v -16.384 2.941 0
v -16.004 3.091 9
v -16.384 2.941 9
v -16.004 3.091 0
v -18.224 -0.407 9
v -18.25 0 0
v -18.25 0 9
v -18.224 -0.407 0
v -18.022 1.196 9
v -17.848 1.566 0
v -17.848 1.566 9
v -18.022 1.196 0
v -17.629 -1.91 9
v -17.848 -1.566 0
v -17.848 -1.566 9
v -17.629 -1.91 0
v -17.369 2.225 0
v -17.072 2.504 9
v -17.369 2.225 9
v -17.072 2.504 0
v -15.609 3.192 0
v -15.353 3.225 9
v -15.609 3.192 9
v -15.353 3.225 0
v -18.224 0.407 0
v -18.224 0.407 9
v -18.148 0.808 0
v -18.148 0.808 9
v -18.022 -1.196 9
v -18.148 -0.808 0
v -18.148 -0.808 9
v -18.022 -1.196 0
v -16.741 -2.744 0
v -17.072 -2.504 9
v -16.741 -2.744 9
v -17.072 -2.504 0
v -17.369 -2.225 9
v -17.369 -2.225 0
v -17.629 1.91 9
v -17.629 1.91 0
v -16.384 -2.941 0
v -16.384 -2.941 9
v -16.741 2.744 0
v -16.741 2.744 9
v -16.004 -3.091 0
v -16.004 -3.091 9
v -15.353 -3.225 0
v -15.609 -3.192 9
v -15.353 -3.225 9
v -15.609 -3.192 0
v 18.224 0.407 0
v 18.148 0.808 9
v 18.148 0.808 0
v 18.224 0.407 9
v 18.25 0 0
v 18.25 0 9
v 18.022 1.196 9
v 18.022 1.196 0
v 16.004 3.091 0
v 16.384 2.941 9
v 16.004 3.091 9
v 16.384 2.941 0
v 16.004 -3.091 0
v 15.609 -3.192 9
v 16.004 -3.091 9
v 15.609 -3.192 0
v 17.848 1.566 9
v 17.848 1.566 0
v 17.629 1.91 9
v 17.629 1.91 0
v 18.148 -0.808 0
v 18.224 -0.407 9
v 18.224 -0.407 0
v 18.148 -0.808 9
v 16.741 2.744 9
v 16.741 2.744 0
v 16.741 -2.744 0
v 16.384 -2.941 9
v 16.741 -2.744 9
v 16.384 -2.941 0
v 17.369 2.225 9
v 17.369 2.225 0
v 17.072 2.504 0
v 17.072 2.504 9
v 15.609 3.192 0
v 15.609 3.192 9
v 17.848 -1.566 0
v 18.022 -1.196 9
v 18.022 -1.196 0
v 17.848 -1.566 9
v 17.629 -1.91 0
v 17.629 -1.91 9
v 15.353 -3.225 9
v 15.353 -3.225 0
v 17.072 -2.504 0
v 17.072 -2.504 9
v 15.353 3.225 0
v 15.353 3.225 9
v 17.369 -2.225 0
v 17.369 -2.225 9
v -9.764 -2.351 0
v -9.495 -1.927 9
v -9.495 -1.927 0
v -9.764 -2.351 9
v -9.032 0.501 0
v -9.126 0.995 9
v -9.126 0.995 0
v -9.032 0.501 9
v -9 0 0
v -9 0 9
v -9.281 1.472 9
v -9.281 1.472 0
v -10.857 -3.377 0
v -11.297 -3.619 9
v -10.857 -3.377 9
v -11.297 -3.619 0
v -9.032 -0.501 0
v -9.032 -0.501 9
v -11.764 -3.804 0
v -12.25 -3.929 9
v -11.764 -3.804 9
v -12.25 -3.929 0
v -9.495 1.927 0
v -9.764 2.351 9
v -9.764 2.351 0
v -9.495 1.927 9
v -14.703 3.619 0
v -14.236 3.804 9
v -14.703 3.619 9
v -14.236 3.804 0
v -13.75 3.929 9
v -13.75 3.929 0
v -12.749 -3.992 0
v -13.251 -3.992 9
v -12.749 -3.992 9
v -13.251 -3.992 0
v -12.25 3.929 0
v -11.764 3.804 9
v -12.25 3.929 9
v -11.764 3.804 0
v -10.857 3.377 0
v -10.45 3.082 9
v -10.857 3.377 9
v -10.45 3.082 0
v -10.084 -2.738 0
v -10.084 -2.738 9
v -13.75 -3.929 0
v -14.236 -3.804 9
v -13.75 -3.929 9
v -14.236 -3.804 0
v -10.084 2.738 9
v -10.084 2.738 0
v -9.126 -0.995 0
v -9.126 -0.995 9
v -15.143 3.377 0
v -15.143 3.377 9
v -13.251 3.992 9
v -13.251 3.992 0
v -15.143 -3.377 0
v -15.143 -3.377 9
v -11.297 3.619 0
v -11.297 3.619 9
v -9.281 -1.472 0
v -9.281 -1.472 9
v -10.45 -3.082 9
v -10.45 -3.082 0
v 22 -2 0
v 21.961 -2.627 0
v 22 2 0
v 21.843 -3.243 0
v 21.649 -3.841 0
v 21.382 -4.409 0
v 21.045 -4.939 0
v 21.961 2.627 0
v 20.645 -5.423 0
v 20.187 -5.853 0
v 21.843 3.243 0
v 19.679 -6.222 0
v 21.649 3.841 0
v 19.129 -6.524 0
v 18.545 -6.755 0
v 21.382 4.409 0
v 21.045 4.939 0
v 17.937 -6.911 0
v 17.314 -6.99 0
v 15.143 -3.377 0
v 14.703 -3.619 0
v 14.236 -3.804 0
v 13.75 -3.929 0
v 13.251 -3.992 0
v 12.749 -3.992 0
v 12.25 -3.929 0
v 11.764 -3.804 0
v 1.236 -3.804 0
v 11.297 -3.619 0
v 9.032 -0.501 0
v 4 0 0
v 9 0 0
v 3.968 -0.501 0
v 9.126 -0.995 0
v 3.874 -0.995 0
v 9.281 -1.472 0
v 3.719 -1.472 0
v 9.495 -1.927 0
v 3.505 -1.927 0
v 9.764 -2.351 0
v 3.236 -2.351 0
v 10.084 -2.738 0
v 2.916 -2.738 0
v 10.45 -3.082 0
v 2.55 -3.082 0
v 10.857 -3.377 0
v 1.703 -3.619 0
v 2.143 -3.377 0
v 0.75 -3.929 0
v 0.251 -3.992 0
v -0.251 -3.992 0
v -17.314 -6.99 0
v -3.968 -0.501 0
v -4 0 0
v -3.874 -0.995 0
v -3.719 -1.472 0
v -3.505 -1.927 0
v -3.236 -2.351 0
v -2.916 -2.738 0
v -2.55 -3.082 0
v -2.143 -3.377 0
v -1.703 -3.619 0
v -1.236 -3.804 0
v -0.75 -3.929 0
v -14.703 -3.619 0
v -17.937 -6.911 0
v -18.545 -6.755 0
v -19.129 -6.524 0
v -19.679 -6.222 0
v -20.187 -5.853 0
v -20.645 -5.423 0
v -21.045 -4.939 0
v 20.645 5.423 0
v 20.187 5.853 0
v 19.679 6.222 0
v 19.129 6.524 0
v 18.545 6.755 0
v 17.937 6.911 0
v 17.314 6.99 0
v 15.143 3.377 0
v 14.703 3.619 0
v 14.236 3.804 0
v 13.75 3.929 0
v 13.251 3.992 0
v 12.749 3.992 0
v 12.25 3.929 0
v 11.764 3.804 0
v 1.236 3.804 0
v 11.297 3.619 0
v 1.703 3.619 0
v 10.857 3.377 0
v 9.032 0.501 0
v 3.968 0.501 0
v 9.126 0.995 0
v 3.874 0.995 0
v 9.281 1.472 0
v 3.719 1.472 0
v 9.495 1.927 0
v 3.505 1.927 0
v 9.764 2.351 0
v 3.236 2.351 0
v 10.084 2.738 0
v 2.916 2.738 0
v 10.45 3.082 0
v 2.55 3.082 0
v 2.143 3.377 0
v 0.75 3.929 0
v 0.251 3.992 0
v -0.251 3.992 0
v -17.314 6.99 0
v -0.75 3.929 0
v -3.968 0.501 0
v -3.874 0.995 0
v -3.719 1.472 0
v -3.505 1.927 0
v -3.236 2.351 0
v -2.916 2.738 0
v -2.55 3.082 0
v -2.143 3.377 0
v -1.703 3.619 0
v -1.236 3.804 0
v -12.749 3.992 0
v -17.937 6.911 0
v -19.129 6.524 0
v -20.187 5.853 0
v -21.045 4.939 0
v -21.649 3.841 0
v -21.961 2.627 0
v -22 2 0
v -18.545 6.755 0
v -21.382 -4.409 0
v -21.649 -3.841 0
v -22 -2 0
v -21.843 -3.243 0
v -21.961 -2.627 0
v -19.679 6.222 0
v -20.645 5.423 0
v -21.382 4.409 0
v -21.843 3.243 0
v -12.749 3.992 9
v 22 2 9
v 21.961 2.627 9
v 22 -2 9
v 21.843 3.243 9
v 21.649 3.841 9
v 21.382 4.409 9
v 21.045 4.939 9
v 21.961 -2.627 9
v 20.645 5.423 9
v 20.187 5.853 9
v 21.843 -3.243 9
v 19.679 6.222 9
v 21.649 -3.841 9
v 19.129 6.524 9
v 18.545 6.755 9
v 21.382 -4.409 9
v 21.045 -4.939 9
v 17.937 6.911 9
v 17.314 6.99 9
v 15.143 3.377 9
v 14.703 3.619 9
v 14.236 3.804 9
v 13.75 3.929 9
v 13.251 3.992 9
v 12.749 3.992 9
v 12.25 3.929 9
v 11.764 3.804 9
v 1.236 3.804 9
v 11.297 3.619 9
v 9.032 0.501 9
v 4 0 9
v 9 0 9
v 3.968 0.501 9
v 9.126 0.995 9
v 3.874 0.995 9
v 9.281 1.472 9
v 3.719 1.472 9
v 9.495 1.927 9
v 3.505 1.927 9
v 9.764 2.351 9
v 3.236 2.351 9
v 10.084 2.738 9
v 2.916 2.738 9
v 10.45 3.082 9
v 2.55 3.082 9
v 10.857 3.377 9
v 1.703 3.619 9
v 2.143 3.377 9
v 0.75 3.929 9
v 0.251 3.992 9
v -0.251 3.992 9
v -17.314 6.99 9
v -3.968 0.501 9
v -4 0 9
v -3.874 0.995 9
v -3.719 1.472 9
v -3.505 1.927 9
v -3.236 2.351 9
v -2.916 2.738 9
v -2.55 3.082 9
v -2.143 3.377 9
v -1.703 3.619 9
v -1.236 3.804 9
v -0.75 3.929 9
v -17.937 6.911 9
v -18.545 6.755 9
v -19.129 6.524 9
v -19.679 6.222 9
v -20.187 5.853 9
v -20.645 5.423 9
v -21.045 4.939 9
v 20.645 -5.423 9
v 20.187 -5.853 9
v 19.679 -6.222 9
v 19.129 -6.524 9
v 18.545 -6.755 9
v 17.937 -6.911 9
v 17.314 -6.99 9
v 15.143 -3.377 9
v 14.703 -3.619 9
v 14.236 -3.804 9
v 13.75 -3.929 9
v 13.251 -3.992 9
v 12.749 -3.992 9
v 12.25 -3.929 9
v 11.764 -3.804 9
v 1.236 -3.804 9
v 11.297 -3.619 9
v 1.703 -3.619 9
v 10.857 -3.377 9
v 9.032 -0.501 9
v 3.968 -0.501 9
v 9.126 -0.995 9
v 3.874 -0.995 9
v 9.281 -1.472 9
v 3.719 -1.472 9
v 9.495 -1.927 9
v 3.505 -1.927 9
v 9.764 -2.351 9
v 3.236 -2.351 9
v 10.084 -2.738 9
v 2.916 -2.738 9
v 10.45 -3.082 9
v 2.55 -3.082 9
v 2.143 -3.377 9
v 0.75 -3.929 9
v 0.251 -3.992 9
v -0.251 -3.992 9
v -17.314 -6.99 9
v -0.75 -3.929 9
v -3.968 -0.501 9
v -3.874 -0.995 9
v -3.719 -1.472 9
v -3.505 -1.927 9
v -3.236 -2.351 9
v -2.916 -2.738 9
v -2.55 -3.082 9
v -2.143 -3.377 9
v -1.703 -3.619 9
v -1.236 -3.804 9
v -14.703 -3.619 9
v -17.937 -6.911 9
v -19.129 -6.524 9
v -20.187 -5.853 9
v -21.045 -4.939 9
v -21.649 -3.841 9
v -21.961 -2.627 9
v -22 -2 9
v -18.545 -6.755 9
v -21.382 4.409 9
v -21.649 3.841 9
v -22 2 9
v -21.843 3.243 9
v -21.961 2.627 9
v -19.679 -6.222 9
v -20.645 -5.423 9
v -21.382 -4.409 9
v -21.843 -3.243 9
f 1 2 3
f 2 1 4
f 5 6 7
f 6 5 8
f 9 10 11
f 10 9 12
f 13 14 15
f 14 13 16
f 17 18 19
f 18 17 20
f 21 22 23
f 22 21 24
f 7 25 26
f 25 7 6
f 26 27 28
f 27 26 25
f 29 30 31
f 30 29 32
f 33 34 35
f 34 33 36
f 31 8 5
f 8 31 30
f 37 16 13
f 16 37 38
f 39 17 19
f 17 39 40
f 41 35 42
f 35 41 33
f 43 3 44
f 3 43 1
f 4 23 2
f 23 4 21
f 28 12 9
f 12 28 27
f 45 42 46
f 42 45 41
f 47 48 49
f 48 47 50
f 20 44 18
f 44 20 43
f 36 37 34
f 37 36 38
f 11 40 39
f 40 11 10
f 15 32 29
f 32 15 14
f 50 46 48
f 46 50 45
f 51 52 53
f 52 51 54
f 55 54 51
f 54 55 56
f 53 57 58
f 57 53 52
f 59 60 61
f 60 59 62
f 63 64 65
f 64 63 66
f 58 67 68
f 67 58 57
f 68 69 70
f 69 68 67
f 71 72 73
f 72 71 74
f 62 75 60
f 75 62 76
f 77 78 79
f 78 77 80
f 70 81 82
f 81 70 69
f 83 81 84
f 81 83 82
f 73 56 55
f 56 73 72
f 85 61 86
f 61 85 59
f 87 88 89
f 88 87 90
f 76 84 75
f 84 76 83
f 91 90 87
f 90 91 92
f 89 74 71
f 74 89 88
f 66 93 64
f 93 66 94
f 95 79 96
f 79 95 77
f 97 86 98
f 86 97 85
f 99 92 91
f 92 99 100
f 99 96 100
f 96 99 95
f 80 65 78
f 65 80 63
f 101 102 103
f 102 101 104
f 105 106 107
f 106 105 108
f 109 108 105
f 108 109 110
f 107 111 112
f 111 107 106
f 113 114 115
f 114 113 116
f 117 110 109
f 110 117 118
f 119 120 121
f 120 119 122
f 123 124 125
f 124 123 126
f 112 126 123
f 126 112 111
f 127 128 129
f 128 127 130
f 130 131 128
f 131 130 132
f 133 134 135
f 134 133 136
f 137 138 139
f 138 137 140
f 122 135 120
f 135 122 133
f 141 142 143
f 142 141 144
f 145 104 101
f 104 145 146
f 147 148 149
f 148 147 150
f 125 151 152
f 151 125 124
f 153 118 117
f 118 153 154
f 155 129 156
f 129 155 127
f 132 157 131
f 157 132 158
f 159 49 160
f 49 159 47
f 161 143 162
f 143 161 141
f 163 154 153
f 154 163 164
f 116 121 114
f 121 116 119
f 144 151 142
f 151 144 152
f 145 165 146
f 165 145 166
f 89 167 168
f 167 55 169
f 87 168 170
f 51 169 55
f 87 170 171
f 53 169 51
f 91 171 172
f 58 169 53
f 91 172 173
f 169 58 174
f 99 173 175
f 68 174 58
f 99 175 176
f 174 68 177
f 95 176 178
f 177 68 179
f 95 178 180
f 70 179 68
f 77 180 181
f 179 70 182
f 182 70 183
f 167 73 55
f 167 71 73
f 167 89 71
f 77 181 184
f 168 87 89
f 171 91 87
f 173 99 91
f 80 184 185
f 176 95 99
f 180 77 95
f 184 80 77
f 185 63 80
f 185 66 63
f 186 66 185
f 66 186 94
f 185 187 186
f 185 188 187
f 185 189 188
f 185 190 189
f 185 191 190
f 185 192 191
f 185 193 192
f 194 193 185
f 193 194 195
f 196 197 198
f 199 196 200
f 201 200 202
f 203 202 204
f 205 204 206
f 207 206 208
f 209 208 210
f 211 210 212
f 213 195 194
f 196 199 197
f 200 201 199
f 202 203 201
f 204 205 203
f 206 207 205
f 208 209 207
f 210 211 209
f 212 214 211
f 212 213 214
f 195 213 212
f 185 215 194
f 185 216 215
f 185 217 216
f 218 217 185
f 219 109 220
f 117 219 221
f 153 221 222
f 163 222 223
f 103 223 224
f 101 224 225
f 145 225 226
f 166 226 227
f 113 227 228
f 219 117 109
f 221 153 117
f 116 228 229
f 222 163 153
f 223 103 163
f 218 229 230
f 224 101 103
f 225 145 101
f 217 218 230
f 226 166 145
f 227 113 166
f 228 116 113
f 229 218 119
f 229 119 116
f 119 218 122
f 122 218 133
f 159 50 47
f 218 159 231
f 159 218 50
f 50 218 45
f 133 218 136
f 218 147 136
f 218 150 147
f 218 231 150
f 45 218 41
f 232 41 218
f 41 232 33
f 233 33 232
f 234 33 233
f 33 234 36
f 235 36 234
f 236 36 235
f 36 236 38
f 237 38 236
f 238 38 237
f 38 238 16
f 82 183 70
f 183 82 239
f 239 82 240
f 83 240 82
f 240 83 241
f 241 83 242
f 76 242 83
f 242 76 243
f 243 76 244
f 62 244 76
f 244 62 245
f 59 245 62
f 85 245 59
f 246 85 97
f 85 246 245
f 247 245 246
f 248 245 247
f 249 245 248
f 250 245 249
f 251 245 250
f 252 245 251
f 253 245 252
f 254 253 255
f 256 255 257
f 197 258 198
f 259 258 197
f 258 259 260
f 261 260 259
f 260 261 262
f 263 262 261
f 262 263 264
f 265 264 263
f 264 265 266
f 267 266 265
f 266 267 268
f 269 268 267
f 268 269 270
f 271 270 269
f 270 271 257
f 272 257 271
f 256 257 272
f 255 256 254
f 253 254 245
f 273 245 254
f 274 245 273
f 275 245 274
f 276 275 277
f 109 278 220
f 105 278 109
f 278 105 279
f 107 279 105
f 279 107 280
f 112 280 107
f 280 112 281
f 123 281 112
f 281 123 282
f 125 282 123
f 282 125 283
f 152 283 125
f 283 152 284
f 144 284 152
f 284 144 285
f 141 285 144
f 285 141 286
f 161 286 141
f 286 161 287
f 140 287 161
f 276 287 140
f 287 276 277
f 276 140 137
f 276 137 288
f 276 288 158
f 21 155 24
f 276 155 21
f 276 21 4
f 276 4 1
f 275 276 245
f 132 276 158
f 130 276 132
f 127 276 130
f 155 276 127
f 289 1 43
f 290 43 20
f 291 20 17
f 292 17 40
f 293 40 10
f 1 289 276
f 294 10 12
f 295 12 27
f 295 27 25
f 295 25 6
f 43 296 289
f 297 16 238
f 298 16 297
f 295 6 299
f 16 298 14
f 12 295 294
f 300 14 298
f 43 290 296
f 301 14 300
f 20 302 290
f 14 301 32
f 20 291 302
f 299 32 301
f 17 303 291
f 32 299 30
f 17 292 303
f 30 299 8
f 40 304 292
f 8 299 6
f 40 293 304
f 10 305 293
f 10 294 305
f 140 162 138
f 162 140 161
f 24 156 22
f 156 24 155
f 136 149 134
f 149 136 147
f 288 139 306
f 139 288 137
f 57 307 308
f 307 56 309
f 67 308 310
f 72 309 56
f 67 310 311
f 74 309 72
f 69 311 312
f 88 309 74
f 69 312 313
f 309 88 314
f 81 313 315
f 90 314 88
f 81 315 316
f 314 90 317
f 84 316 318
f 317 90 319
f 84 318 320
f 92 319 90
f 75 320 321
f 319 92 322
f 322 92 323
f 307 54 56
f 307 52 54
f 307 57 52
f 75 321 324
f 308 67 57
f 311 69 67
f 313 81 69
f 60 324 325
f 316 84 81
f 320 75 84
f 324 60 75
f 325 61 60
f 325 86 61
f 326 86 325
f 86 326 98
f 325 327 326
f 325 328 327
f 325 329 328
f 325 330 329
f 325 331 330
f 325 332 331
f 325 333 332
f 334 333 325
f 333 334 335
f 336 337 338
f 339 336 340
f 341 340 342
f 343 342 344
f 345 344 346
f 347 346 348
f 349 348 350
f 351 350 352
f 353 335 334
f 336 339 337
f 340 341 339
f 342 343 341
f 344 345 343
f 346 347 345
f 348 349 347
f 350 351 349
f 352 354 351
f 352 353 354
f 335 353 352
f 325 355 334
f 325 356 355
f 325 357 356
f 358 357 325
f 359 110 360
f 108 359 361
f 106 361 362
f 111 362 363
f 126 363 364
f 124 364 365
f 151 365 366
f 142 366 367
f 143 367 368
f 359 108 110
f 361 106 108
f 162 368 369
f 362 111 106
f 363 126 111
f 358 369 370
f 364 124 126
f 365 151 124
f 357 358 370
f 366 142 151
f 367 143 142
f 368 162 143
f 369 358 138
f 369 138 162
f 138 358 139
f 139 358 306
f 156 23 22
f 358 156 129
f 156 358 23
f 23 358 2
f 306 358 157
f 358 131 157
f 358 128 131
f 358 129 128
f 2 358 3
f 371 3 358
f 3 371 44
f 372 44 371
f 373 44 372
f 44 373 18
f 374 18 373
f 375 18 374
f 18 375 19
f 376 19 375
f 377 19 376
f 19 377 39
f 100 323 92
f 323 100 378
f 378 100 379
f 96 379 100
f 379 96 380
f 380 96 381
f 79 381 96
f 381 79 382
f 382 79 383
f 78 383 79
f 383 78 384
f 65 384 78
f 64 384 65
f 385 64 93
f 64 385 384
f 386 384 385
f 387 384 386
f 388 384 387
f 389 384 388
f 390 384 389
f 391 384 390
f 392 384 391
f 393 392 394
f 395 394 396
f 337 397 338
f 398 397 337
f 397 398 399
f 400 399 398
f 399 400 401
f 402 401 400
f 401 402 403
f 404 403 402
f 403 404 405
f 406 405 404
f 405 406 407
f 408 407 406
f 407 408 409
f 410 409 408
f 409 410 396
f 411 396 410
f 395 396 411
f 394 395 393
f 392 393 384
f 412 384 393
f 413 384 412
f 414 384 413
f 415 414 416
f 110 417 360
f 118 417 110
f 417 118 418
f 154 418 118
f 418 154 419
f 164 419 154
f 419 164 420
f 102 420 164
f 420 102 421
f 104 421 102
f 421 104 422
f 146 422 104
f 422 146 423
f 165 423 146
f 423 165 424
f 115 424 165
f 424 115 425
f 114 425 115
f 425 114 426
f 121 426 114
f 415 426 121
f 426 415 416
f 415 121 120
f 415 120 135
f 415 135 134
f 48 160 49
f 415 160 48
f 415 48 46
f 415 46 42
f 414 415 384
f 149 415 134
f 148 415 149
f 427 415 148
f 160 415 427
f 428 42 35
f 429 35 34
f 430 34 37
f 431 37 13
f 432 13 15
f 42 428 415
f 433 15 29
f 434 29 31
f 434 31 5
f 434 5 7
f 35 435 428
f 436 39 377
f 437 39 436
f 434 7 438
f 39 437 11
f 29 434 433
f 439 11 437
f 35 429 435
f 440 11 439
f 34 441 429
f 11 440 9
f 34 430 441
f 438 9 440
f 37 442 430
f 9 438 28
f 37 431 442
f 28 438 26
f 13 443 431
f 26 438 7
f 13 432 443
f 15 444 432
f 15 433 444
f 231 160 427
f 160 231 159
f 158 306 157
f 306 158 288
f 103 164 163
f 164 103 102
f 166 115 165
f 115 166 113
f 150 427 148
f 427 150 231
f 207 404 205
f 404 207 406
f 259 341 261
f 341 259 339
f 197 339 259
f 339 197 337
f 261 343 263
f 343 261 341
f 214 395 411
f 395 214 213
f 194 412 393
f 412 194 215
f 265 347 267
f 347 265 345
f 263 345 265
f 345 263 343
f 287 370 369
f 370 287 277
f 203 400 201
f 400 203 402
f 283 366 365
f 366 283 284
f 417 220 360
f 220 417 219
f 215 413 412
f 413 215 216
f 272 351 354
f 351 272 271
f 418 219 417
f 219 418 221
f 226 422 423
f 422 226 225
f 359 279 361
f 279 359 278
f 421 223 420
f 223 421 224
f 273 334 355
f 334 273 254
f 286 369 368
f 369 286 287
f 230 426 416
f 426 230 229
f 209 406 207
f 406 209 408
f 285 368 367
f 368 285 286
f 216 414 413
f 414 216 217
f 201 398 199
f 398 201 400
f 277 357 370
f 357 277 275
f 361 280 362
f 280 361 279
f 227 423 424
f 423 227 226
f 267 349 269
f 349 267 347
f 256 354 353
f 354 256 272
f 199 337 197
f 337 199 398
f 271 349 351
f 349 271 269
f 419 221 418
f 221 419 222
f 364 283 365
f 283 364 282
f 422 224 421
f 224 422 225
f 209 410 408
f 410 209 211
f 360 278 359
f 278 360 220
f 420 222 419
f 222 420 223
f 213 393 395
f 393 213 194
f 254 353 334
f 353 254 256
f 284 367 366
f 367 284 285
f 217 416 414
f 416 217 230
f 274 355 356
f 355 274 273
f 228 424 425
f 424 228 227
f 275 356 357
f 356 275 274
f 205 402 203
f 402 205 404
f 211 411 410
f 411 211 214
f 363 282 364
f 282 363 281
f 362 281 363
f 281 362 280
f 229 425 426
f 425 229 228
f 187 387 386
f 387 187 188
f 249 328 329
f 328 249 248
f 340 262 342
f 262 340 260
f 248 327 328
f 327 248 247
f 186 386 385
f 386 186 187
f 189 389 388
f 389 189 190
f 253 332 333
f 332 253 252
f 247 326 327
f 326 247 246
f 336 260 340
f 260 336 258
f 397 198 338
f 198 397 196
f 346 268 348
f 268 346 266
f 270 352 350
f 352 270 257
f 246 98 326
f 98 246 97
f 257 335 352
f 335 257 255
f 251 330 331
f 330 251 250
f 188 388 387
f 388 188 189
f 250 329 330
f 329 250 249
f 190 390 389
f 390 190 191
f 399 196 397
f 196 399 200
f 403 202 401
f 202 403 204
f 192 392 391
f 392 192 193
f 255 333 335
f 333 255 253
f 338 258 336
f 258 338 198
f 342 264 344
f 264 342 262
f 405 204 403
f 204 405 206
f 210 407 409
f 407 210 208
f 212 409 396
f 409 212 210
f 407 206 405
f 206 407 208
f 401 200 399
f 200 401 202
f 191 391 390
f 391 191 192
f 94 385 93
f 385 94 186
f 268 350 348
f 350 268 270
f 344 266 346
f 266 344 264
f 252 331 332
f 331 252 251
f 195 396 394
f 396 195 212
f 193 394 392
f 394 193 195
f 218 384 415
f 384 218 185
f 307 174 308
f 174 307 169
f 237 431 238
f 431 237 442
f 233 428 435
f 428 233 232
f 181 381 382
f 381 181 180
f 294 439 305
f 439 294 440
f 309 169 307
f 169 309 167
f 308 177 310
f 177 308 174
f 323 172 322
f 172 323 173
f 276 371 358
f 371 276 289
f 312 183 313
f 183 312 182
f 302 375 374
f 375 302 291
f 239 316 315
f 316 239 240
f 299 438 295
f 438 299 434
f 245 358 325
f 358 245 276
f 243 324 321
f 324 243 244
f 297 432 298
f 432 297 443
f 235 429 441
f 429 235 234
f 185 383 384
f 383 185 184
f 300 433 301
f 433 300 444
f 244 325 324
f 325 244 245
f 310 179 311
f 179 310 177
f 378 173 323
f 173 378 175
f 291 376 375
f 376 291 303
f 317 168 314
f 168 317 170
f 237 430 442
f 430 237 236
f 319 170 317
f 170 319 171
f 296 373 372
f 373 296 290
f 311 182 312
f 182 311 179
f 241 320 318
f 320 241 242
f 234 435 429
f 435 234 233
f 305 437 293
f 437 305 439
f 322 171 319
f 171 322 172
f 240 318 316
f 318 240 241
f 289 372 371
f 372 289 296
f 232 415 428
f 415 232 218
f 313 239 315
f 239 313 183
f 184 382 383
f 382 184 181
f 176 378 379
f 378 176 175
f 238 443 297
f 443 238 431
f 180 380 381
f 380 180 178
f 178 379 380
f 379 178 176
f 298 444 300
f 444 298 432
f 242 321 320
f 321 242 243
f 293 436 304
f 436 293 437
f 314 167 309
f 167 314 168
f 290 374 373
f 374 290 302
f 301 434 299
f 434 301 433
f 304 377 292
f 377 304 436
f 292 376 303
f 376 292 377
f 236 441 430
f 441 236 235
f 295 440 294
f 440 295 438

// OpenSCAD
$fn = 50;


difference() {
	union() {
		hull() {
			translate(v = [-17.0000000000, 2.0000000000, 0]) {
				cylinder(h = 9, r = 5);
			}
			translate(v = [17.0000000000, 2.0000000000, 0]) {
				cylinder(h = 9, r = 5);
			}
			translate(v = [-17.0000000000, -2.0000000000, 0]) {
				cylinder(h = 9, r = 5);
			}
			translate(v = [17.0000000000, -2.0000000000, 0]) {
				cylinder(h = 9, r = 5);
			}
		}
	}
	union() {
		#translate(v = [-15.0000000000, 0.0000000000, -100.0000000000]) {
			cylinder(h = 200, r = 3.2500000000);
		}
		#translate(v = [-15.0000000000, 0.0000000000, -100.0000000000]) {
			cylinder(h = 200, r = 3.2500000000);
		}
		#translate(v = [15.0000000000, 0.0000000000, -100.0000000000]) {
			cylinder(h = 200, r = 3.2500000000);
		}
		#translate(v = [15.0000000000, 0.0000000000, -100.0000000000]) {
			cylinder(h = 200, r = 3.2500000000);
		}
		#translate(v = [-13.0000000000, 0, 0]) {
			cylinder(h = 9, r = 4.0000000000);
		}
		#cylinder(h = 9, r = 4.0000000000);
		#translate(v = [13.0000000000, 0, 0]) {
			cylinder(h = 9, r = 4.0000000000);
		}
	}
}
